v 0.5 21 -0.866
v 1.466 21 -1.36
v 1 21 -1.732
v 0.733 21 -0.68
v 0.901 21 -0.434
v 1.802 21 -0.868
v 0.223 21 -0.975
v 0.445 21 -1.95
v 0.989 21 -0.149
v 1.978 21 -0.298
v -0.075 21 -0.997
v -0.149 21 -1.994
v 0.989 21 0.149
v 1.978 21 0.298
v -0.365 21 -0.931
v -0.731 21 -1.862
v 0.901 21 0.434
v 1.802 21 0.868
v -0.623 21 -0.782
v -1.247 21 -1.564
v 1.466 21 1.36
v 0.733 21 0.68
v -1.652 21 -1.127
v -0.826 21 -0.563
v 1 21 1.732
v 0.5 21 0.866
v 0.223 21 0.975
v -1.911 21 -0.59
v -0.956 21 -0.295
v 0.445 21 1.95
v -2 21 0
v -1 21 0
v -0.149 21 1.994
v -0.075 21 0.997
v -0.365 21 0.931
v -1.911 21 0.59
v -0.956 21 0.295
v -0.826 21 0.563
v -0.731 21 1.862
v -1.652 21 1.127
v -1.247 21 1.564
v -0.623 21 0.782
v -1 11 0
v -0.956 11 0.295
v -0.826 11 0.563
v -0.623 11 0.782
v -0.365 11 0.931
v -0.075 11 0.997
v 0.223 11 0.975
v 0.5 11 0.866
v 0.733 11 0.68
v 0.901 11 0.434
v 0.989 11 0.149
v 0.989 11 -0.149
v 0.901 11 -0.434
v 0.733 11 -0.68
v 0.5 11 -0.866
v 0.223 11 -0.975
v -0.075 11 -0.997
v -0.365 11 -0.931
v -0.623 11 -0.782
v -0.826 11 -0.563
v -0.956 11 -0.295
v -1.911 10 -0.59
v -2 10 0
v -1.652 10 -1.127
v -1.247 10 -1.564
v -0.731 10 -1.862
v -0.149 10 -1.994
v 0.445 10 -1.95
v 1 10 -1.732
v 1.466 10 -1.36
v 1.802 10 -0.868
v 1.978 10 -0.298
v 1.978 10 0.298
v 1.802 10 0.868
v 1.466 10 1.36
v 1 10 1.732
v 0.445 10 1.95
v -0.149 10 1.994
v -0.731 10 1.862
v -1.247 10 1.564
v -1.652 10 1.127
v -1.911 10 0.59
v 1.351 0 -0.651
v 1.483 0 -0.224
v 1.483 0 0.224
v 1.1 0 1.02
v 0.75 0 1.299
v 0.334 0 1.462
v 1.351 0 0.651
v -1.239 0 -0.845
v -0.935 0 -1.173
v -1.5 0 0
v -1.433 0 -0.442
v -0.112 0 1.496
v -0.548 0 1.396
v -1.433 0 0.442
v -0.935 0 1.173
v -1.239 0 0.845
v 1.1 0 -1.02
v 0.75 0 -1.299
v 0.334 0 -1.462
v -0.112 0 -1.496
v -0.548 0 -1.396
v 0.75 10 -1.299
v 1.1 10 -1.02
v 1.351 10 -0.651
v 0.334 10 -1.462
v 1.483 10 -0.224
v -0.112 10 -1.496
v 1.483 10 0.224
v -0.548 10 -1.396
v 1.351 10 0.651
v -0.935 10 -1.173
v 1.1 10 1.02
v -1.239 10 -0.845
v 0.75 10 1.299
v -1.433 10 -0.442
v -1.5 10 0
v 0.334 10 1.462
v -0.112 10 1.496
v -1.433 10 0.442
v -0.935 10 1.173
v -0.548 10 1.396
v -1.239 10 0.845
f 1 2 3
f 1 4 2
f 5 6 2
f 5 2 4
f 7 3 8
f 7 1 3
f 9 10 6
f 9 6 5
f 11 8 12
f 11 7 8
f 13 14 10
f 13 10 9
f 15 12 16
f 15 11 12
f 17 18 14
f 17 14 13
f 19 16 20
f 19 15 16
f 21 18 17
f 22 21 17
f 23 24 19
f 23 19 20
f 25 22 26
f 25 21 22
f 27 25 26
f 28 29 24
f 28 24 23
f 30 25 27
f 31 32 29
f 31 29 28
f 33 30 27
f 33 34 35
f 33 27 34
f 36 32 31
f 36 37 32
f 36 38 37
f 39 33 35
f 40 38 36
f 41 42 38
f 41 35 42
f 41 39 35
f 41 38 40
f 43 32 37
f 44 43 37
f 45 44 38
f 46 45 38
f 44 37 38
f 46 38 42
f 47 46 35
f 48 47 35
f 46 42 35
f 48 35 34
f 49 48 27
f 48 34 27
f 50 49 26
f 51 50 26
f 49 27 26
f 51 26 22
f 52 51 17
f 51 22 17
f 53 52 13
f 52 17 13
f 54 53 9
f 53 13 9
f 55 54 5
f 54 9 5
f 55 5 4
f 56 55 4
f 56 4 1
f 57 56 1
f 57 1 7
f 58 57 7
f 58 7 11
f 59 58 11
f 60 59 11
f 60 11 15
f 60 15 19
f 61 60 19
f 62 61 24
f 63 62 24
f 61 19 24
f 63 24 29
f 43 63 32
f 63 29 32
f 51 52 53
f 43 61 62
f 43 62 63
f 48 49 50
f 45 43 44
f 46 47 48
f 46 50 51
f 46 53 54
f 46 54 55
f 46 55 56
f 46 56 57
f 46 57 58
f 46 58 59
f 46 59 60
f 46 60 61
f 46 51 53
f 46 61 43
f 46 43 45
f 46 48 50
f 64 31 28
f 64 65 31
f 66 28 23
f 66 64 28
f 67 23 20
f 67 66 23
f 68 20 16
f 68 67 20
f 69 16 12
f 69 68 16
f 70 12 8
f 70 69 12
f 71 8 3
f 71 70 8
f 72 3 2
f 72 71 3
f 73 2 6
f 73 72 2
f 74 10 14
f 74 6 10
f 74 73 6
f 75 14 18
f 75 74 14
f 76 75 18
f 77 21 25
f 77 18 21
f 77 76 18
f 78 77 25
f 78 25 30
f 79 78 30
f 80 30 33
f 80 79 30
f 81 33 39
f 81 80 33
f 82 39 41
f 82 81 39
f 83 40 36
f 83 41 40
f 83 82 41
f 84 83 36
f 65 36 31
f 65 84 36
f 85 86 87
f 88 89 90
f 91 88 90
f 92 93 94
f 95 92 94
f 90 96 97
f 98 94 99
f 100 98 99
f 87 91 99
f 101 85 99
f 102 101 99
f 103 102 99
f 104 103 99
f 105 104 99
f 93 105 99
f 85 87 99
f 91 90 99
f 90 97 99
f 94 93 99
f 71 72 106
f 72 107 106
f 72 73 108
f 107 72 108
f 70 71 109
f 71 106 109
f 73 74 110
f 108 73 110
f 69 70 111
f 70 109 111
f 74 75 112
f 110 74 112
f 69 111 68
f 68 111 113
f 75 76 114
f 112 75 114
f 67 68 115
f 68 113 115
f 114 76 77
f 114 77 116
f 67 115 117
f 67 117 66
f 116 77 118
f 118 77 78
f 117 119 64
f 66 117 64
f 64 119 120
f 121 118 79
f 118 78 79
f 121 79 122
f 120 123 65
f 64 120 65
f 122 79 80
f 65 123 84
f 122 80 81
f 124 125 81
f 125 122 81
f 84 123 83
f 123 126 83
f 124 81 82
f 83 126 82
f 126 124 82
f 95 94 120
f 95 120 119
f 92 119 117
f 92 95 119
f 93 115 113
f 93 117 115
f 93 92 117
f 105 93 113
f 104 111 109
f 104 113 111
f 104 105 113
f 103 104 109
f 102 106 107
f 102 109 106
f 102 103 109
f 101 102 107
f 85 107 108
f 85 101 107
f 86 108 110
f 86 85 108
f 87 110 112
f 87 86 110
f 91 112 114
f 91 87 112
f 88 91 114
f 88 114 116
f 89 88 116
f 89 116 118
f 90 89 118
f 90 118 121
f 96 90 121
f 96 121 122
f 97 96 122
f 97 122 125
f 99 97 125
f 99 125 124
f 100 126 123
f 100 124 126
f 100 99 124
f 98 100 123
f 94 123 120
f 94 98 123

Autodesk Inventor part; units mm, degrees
ref_plane "YZ Plane" through (0, 0, 0) normal (1, 0, 0) x (0, 1, 0)
ref_plane "XZ Plane" through (0, 0, 0) normal (0, 1, 0) x (-1, 0, 0)
ref_plane "XY Plane" through (0, 0, 0) normal (0, 0, 1) x (1, 0, 0)
sketch "Sketch1" plane through (0, 0, 0) normal (0, 0, 1) x (1, 0, 0)
  line L0 (0, 11) -> (-1, 11)
  line L1 (-1, 11) -> (-1, 21)
  line L2 (-1, 21) -> (-2, 21)
  line L3 (-2, 21) -> (-2, 10)
  line L4 (-2, 10) -> (-1.5, 10)
  line L5 (-1.5, 10) -> (-1.5, 0)
  line L6 (-1.5, 0) -> (0, 0)
  line L7 (0, 0) -> (0, 11)
  dimension "d0" = 1
  dimension "d1" = 1.5
  dimension "d3" = 10
  dimension "d5" = 11
  dimension "d9" = 10
  dimension "d12" = 1
revolve "Revolution1" add sketch "Sketch1" angle 360 about axis through (0, 0, 0) along (0, 1, 0)
thread "Thread4" size "M2x0.4" class "6H" standard "ANSI Metric M Profile" full length
properties part number "Fitting-2" material "Brass"
